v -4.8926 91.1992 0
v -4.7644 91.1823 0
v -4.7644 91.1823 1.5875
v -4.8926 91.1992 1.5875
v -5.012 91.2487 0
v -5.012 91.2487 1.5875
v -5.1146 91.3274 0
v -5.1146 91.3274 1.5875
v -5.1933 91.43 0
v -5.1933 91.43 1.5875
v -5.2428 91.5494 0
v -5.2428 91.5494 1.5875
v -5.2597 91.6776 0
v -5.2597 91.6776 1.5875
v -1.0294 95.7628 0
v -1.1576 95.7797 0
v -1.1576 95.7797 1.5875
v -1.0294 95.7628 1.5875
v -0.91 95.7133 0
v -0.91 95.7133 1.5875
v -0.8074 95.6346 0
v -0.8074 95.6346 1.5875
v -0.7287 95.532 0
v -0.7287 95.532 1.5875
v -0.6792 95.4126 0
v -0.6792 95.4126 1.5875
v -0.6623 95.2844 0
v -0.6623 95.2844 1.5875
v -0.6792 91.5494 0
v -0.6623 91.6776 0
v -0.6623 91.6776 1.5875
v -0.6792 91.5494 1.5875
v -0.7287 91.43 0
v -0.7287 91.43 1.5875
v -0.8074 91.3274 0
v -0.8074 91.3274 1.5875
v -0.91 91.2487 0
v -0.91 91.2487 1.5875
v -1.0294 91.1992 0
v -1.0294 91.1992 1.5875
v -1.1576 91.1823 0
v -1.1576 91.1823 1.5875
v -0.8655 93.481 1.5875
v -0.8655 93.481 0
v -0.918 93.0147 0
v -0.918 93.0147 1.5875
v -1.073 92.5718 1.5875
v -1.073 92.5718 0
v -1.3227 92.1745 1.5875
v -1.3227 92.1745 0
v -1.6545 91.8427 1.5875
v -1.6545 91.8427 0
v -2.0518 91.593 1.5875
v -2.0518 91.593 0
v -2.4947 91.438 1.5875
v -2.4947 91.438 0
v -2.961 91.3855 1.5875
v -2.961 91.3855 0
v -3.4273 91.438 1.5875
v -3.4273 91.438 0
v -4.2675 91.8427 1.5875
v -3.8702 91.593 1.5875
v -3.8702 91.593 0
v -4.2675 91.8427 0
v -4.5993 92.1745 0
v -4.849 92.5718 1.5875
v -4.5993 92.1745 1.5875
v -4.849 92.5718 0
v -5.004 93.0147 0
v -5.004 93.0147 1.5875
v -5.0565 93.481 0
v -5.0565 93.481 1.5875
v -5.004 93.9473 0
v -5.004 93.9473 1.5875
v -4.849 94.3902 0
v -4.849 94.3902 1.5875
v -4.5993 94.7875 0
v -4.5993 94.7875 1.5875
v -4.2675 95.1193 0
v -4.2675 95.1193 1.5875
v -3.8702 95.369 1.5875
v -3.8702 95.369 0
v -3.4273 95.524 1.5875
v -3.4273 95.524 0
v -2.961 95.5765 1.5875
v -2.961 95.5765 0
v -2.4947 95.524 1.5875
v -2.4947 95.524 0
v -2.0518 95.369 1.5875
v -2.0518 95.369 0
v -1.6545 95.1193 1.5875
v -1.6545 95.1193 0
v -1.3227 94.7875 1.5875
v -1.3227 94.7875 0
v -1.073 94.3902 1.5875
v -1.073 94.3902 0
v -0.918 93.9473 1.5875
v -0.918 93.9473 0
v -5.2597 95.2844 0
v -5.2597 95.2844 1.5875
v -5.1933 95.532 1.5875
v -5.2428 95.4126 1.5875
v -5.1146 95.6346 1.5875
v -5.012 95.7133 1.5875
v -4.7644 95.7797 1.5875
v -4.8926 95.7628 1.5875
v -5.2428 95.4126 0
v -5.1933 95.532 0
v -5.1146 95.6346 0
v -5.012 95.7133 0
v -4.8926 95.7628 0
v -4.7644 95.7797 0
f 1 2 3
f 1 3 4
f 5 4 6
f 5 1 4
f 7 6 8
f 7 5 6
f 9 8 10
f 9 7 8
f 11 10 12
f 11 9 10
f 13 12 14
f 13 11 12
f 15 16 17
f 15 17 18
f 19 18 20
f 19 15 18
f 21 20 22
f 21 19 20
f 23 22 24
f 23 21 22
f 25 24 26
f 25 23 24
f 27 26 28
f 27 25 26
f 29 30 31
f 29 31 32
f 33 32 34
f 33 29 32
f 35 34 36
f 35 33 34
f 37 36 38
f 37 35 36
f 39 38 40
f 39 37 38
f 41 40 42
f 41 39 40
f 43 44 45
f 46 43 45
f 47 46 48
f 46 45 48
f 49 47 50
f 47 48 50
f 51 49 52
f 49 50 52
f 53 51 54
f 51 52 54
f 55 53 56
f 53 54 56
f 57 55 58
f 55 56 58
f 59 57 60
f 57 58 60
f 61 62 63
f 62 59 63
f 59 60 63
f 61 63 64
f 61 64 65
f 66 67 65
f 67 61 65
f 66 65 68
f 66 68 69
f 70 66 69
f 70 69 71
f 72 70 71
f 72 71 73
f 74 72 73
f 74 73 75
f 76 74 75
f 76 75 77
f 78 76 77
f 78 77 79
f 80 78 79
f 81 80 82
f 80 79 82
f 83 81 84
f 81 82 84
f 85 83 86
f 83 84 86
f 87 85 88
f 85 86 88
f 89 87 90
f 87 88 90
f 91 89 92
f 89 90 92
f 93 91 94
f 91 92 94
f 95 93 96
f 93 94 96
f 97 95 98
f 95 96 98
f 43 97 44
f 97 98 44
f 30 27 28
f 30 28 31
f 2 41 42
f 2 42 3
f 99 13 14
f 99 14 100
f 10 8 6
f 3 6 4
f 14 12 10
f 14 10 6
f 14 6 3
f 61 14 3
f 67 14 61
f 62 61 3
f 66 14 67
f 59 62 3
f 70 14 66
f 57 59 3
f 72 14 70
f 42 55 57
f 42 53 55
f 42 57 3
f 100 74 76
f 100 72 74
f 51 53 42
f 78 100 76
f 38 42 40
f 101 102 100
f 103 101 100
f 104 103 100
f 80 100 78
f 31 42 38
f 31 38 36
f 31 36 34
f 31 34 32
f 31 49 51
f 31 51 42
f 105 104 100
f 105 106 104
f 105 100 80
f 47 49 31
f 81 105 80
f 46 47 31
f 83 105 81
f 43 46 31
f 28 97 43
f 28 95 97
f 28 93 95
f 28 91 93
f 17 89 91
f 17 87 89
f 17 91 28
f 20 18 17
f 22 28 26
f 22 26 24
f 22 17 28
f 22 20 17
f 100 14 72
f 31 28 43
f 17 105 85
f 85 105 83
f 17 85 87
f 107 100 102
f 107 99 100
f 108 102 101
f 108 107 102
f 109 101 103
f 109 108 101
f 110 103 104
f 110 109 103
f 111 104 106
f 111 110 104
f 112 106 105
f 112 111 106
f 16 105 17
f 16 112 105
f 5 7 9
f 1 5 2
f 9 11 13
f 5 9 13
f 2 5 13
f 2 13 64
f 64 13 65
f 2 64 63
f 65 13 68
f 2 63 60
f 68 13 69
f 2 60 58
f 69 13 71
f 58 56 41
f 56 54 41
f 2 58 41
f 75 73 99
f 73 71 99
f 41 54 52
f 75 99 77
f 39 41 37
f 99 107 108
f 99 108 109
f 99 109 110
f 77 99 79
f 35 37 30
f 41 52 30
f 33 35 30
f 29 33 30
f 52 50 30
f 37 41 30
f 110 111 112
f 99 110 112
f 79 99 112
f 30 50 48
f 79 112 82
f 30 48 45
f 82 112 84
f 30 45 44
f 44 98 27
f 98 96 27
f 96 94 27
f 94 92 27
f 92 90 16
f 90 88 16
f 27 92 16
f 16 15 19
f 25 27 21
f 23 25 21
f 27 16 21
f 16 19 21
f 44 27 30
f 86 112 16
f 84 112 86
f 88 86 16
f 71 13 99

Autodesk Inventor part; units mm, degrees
ref_plane "YZ Plane" through (0, 0, 0) normal (1, 0, 0) x (0, 1, 0)
ref_plane "XZ Plane" through (0, 0, 0) normal (0, 1, 0) x (-1, 0, 0)
ref_plane "XY Plane" through (0, 0, 0) normal (0, 0, 1) x (1, 0, 0)
sketch "Sketch1" plane through (0, 0, 0) normal (0, 0, 1) x (1, 0, 0)
  line L0 (-5.2597, 91.6776) -> (-5.2597, 95.2844)
  arc A0 (-4.7644, 95.7797) -> (-5.2597, 95.2844) centre (-4.7644, 95.2844) ccw
  line L1 (-4.7644, 95.7797) -> (-1.1576, 95.7797)
  arc A1 (-0.6623, 95.2844) -> (-1.1576, 95.7797) centre (-1.1576, 95.2844) ccw
  line L2 (-0.6623, 95.2844) -> (-0.6623, 91.6776)
  arc A2 (-1.1576, 91.1823) -> (-0.6623, 91.6776) centre (-1.1576, 91.6776) ccw
  line L3 (-1.1576, 91.1823) -> (-4.7644, 91.1823)
  arc A3 (-5.2597, 91.6776) -> (-4.7644, 91.1823) centre (-4.7644, 91.6776) ccw
  circle A4 centre (-2.961, 93.481) radius 2.0955
  point P0 (0, 0)
  dimension "d0" = 4.191
extrude "Extrusion1" add sketch "Sketch1" along normal blind 1.5875
properties part number "screw_center"
